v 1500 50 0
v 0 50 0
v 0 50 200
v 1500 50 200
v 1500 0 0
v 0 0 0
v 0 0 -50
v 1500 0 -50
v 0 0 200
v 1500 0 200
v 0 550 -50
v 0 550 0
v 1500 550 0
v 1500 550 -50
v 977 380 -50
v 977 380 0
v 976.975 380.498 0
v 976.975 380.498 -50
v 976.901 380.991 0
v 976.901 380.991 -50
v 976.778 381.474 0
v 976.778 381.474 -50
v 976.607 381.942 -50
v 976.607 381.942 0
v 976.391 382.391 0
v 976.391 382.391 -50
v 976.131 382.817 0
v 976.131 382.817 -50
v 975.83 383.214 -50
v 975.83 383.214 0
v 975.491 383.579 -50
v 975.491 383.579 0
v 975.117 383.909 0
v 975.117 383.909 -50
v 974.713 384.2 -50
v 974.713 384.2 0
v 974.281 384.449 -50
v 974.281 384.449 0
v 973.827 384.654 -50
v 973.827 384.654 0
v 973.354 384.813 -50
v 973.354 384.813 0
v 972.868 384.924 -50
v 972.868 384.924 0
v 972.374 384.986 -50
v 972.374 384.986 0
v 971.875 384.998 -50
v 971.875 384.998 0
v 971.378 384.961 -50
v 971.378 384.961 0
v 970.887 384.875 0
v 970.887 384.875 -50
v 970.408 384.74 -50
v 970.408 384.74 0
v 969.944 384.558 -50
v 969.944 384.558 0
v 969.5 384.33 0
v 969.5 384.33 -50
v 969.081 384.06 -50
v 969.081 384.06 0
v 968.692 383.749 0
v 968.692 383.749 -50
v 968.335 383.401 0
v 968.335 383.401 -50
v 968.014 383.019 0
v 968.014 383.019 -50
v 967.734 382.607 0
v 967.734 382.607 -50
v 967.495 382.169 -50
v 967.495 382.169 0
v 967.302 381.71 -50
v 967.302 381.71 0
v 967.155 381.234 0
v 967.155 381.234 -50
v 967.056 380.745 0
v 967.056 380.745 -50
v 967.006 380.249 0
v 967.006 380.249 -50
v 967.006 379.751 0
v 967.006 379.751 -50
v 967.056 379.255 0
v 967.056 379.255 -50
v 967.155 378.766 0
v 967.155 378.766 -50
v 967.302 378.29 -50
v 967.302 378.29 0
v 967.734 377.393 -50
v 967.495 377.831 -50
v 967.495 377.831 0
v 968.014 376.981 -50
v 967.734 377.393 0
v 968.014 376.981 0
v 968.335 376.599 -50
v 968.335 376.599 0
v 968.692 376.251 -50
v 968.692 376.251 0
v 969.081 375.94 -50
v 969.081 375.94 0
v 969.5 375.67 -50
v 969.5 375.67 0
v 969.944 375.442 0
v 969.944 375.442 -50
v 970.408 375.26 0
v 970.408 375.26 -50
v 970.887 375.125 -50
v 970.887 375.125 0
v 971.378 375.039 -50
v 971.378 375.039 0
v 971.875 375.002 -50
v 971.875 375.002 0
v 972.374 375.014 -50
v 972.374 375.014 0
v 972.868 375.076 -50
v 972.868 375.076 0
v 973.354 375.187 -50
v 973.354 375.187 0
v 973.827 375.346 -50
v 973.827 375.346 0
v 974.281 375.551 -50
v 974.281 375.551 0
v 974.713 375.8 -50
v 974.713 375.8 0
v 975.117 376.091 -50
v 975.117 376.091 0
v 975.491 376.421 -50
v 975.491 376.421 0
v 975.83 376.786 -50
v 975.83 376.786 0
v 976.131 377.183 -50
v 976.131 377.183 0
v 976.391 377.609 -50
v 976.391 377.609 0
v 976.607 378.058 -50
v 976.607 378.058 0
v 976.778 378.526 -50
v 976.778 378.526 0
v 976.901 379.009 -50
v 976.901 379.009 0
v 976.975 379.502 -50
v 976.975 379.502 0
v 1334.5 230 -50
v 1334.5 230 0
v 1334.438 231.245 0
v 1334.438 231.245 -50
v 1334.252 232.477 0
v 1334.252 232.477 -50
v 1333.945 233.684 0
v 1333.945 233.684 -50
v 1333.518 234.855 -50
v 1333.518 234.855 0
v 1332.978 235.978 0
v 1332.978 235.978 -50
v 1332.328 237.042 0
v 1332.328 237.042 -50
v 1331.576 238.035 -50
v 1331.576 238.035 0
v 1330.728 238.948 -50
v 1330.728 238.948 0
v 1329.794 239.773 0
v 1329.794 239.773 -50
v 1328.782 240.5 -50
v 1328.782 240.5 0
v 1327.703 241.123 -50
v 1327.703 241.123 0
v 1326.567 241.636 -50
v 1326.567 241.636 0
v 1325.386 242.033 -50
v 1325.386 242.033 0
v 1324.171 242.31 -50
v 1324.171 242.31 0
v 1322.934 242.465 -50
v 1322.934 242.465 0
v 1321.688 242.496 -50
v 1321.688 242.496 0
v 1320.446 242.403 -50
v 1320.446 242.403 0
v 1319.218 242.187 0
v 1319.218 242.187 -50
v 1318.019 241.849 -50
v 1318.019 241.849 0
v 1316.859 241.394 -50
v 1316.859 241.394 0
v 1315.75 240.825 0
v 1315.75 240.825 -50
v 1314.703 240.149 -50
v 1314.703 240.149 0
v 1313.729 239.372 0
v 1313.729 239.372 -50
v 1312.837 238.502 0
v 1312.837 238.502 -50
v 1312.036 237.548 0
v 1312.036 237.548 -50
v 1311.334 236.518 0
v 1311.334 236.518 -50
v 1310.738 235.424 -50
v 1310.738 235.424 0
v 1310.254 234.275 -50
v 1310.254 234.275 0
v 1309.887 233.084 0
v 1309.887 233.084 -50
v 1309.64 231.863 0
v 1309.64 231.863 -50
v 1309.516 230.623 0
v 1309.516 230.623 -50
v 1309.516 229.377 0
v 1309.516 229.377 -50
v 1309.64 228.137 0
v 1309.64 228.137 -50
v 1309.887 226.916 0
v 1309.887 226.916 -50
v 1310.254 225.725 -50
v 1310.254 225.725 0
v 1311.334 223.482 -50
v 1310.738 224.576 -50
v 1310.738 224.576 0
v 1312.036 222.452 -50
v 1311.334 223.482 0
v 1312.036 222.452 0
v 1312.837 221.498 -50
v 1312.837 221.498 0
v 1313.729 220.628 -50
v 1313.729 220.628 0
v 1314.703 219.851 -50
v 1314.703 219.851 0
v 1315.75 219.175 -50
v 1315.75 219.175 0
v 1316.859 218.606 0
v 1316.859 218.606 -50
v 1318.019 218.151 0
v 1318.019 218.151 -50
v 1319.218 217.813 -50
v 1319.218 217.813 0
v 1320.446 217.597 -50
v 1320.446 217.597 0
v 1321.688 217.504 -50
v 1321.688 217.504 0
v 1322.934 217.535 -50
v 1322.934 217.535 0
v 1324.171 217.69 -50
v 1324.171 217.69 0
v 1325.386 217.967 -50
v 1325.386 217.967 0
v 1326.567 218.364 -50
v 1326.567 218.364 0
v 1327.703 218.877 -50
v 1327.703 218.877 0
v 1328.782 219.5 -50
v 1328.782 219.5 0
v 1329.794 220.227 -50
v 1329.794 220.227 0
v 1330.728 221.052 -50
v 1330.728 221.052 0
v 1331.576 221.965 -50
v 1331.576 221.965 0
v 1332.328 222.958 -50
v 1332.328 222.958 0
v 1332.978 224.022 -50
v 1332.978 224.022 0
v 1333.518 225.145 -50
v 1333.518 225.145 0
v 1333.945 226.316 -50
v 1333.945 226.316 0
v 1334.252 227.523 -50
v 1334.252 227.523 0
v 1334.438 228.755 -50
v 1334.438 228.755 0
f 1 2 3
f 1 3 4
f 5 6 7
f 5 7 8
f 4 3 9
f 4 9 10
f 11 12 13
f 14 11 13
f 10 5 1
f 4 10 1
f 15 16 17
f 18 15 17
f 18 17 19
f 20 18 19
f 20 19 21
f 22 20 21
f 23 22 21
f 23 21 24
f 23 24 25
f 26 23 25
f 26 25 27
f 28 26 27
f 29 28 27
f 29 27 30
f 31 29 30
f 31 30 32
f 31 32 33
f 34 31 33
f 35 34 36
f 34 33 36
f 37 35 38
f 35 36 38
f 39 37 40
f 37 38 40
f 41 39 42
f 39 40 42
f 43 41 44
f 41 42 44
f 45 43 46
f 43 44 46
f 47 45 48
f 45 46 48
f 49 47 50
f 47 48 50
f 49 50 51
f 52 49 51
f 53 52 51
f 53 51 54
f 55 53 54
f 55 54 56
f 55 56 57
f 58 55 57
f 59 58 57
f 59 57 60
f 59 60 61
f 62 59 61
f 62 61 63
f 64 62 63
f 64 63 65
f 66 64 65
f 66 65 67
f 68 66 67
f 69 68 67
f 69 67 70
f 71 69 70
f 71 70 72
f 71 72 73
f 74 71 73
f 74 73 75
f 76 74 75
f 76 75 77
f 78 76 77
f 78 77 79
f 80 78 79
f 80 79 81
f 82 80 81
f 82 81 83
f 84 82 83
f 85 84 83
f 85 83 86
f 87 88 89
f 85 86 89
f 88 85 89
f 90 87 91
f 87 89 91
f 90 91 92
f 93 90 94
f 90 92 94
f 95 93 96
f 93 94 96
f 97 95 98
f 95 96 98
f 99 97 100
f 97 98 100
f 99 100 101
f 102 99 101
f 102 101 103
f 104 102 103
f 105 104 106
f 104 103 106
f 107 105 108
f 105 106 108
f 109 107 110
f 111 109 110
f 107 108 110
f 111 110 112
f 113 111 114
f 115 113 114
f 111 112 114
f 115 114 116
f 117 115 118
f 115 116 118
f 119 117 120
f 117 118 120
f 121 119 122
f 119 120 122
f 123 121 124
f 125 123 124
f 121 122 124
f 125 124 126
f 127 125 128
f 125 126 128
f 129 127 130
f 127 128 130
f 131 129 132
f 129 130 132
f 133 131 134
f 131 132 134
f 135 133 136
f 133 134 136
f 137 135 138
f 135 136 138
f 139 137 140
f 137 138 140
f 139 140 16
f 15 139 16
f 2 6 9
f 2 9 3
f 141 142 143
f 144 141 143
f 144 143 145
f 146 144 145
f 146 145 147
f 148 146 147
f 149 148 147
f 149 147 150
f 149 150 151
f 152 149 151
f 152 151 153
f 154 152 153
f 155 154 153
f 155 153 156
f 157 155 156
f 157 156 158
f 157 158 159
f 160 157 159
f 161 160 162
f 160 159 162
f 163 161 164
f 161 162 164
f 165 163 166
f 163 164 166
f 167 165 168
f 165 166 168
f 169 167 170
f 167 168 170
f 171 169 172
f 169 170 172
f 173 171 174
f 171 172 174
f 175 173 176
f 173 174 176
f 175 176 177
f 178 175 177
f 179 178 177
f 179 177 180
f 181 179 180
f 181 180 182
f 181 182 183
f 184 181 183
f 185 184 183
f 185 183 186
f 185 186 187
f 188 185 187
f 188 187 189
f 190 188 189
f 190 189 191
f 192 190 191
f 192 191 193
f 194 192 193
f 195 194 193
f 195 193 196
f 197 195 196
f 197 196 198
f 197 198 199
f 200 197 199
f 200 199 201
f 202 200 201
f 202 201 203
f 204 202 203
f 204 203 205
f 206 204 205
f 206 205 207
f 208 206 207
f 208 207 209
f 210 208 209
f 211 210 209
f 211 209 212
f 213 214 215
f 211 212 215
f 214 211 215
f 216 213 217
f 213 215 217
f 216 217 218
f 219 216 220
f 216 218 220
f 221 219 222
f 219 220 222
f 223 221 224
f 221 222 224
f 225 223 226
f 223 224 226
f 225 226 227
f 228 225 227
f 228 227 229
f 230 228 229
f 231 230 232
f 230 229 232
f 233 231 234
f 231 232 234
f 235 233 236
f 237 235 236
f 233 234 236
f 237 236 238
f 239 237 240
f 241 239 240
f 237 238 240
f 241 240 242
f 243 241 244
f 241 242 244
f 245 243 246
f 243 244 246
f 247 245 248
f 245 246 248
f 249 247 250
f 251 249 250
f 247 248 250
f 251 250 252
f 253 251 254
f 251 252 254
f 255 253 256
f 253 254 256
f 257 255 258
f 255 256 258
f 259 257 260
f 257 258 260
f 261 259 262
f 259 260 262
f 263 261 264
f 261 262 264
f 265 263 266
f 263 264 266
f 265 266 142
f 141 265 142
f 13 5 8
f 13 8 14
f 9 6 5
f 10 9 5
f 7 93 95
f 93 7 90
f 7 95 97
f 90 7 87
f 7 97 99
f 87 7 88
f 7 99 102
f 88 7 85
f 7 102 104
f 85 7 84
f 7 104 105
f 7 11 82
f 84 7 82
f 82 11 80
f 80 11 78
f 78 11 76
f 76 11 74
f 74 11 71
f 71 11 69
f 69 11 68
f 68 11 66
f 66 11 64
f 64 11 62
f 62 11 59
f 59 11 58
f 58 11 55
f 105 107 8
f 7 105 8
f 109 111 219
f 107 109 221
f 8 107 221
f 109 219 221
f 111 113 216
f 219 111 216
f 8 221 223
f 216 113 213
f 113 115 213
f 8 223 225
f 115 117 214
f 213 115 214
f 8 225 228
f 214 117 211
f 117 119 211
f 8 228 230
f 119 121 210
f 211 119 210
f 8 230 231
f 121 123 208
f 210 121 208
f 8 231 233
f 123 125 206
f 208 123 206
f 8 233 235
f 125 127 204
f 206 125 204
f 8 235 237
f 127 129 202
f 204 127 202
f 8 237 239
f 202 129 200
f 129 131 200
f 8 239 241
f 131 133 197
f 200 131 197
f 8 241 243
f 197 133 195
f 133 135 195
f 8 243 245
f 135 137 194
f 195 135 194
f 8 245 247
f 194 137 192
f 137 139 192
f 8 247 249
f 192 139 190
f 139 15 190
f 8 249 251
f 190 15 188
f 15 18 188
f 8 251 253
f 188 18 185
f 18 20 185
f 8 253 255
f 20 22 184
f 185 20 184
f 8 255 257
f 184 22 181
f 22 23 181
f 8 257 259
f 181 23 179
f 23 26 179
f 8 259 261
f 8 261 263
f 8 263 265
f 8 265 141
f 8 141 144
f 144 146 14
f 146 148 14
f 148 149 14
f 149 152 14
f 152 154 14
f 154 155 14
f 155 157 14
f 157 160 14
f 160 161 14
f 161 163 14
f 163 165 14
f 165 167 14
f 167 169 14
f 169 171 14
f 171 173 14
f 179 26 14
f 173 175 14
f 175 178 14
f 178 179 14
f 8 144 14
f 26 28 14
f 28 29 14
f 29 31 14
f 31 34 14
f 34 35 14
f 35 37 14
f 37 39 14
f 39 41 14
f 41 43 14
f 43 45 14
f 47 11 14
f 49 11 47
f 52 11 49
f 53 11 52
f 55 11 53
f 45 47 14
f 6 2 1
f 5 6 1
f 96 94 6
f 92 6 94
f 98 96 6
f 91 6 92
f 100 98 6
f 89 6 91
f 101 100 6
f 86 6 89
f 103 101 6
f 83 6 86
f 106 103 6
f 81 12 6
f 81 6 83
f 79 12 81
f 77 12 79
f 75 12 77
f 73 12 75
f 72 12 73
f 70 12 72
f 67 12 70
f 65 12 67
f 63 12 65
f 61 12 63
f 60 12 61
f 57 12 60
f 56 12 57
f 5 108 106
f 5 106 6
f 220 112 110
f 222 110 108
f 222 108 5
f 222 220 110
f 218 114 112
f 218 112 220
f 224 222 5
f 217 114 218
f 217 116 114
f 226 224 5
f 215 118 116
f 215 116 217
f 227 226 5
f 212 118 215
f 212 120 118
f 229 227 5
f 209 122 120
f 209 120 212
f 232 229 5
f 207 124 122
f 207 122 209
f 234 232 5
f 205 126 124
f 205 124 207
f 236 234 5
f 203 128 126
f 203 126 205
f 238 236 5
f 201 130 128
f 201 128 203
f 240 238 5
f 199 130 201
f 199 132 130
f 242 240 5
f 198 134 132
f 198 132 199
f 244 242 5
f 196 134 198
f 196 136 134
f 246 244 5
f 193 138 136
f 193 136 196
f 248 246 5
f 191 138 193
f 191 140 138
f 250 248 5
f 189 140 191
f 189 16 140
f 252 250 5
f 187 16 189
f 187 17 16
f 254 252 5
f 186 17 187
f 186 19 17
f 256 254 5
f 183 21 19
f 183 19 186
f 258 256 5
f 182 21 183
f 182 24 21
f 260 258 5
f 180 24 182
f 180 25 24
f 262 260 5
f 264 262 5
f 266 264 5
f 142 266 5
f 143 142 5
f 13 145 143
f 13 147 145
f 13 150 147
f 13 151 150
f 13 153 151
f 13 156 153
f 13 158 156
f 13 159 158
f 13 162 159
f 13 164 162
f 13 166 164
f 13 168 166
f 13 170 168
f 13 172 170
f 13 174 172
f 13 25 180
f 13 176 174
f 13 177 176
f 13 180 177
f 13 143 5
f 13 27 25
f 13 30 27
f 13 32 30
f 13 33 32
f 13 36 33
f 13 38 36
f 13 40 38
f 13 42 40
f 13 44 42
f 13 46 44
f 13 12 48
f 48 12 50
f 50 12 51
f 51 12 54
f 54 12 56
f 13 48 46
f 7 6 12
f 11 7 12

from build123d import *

# Parameters (mm, degrees)
SKETCH1_W           = 1500
SKETCH1_H           = 550
BOSS_EXTRUDE1_DEPTH = 50
SKETCH2_W           = 1500
SKETCH2_H           = 50
BOSS_EXTRUDE2_DEPTH = 200
SKETCH3_R           = 12.5
SKETCH3_R_2         = 5
CUT_EXTRUDE1_DEPTH  = 1611.12421881


with BuildPart() as part:
    # Sketch1 → Boss-Extrude1 (new body)
    with BuildSketch(Plane.XY):
        with Locations((750, 275)):
            Rectangle(SKETCH1_W, SKETCH1_H)
    extrude(amount=-BOSS_EXTRUDE1_DEPTH)

    # Sketch3 → Cut-Extrude1 (cut, through all)
    with BuildSketch(Plane.XY):
        with Locations((1322, 230)):
            Circle(SKETCH3_R)
        with Locations((972, 380)):
            Circle(SKETCH3_R_2)
    extrude(amount=-CUT_EXTRUDE1_DEPTH, mode=Mode.SUBTRACT)


with BuildPart() as body_2:
    # Sketch2 → Boss-Extrude2 (new body)
    with BuildSketch(Plane.XY):
        with Locations((750, 25)):
            Rectangle(SKETCH2_W, SKETCH2_H)
    extrude(amount=BOSS_EXTRUDE2_DEPTH)


solid = Compound([part.part, body_2.part])
